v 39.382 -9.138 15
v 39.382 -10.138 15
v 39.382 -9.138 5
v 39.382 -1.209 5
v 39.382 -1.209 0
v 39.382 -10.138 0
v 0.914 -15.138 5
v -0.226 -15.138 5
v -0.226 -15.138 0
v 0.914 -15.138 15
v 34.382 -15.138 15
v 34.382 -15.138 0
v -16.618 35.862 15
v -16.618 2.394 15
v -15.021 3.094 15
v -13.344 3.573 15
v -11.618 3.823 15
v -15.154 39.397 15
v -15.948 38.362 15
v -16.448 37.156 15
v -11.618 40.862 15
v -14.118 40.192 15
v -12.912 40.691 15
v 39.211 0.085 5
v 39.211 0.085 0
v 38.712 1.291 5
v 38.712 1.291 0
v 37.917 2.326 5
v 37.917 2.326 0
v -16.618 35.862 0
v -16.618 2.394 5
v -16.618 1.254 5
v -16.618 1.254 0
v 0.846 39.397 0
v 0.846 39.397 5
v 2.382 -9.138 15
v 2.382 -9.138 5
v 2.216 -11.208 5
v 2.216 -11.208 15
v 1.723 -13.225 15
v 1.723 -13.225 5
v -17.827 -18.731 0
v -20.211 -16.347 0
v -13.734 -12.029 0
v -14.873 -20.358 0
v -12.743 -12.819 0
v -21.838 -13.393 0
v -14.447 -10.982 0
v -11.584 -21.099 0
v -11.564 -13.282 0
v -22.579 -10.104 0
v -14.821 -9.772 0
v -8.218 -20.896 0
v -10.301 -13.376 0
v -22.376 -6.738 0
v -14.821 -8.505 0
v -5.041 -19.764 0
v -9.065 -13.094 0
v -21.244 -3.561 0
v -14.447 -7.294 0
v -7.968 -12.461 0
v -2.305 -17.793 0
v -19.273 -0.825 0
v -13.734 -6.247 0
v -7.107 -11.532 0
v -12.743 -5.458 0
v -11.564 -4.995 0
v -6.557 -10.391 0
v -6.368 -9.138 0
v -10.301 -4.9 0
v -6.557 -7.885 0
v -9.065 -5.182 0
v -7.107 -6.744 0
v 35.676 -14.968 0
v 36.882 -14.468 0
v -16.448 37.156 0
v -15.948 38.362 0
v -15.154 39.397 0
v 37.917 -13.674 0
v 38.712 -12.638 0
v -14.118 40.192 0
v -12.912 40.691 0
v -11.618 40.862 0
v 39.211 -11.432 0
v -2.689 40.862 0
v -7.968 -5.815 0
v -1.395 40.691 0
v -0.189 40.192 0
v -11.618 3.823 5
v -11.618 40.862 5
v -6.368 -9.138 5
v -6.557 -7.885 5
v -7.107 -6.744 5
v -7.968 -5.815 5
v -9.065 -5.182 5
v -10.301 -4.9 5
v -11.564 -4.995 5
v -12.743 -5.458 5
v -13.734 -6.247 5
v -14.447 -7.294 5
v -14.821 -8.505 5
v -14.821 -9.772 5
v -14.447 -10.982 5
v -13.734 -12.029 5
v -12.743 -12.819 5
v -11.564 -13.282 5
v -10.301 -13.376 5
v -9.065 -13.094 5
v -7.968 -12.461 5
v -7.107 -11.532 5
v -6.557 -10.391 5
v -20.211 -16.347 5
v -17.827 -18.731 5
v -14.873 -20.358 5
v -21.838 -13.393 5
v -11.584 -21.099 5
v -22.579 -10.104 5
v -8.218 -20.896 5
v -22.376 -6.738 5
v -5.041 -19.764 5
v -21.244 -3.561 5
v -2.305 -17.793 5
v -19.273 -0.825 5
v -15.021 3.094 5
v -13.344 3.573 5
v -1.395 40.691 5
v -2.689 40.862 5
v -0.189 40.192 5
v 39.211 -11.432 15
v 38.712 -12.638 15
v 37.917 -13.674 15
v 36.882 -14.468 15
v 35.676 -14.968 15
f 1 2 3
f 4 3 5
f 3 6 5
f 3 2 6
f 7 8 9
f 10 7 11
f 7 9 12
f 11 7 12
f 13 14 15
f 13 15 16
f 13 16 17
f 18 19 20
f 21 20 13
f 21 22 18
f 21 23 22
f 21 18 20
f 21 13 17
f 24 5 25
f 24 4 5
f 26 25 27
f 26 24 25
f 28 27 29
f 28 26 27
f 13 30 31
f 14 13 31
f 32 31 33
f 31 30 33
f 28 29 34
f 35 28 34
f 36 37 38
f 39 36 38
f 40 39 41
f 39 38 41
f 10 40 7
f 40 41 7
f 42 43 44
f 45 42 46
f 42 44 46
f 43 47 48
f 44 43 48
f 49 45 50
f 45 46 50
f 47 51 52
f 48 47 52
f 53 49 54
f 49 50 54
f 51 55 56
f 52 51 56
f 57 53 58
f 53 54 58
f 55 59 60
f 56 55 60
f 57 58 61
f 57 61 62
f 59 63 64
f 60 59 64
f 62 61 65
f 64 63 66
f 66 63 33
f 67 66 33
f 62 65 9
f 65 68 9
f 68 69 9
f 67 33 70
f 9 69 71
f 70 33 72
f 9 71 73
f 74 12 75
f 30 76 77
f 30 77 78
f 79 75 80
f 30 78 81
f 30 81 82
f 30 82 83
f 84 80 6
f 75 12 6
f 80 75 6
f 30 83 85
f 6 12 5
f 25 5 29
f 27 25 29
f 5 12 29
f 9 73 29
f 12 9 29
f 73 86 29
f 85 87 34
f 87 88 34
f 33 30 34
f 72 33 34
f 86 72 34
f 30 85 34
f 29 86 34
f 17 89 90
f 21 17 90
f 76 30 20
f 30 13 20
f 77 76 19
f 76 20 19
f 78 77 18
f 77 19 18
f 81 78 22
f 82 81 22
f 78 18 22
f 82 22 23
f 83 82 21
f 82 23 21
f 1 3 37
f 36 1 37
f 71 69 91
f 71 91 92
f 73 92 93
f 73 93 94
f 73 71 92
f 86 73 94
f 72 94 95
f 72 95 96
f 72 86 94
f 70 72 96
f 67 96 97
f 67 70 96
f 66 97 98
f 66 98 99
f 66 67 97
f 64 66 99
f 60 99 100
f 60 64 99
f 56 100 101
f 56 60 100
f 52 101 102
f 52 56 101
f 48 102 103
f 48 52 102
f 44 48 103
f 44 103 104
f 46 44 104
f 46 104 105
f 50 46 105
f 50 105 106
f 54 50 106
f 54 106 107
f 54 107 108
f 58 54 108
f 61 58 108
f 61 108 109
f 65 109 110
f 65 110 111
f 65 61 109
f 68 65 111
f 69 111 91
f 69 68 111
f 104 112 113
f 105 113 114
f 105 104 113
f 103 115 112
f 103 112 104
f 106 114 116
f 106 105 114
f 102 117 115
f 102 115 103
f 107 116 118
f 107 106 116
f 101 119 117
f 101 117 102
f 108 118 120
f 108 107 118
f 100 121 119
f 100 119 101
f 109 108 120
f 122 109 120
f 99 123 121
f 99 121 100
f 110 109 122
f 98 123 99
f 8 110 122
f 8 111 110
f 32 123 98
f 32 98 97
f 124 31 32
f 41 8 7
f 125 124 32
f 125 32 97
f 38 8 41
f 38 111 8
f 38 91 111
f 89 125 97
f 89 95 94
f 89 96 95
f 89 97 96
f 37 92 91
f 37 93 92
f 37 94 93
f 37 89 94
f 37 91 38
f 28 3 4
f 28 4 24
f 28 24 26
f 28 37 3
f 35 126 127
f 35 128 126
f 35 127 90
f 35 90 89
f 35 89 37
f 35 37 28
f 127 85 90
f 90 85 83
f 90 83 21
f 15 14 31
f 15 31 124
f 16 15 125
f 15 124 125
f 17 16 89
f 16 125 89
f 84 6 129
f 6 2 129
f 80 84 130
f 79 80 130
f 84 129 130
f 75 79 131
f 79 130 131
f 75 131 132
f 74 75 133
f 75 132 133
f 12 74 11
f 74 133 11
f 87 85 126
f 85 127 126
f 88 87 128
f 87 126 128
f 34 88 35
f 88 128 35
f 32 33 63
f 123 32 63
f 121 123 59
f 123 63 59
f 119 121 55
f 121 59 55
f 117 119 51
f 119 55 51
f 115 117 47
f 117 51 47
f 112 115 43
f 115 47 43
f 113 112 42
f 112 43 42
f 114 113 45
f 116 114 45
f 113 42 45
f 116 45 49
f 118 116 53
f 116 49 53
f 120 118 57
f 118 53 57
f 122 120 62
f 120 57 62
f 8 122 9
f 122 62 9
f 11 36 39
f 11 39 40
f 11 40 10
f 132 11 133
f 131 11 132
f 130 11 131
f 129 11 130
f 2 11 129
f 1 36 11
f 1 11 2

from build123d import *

# Parameters (mm, degrees)
F1_R     = 4.25
F2_DEPTH = 5
F3_DEPTH = 15
F4_R     = 4.99999


# Not quite as in the source:
# - a fillet or chamfer is up to 0.001 mm smaller than in the source, because OpenCascade refuses the exact size
# - a feature names something its author has since deleted; it is built from what else it names


with BuildPart() as f2:
    # F1 (on Top) → F2 (new body)
    with BuildSketch(Plane.XY):
        with BuildLine():
            Line((39.3818591636, 0.8618591636), (-0.6181408364, 0.8618591636))
            Line((-0.6181408364, 0.8618591636), (-0.6181408364, 40.8618591636))
            Line((-0.6181408364, 40.8618591636), (-11.6181408364, 40.8618591636))
            Line((-11.6181408364, 40.8618591636), (-11.6181408364, 3.8233405604))
            ThreePointArc((-11.6181408364, 3.8233405604), (-14.1903183566, 3.3614410672), (-16.6181408364, 2.3944217582))
            Line((-16.6181408364, 2.3944217582), (-16.6181408364, 1.254164009))
            ThreePointArc((-16.6181408364, 1.254164009), (-19.1034222107, -17.6234222107), (-0.225835991, -15.1381408364))
            Line((-0.225835991, -15.1381408364), (0.9144217582, -15.1381408364))
            ThreePointArc((0.9144217582, -15.1381408364), (2.0096719934, -12.2265616521), (2.3818591636, -9.1381408364))
            Line((2.3818591636, -9.1381408364), (39.3818591636, -9.1381408364))
            Line((39.3818591636, -9.1381408364), (39.3818591636, 0.8618591636))
        make_face()
        with Locations((-10.6181408364, -9.1381408364)):
            Circle(F1_R, mode=Mode.SUBTRACT)
        Polygon((-0.6181408364, 40.8618591636), (-0.6181408364, 0.8618591636), (39.3818591636, 0.8618591636), align=None)
    extrude(amount=F2_DEPTH)

    # F1 (on Top) → F3 (join)
    with BuildSketch(Plane.XY):
        with BuildLine():
            Line((39.3818591636, -15.1381408364), (39.3818591636, -9.1381408364))
            Line((39.3818591636, -9.1381408364), (2.3818591636, -9.1381408364))
            ThreePointArc((2.3818591636, -9.1381408364), (2.0096719934, -12.2265616521), (0.9144217582, -15.1381408364))
            Line((0.9144217582, -15.1381408364), (39.3818591636, -15.1381408364))
        make_face()
        with BuildLine():
            Line((-11.6181408364, 3.8233405604), (-11.6181408364, 40.8618591636))
            Line((-11.6181408364, 40.8618591636), (-16.6181408364, 40.8618591636))
            Line((-16.6181408364, 40.8618591636), (-16.6181408364, 2.3944217582))
            ThreePointArc((-16.6181408364, 2.3944217582), (-14.1903183566, 3.3614410672), (-11.6181408364, 3.8233405604))
        make_face()
    extrude(amount=F3_DEPTH)

    # F4 (radius 5 in the source; OpenCascade refuses exactly that, so slightly less here)
    f4_edges = [f2.edges().sort_by_distance(p)[0] for p in [
        (39.381859, -15.138141, 7.5),
        (-16.618141, 40.861859, 7.5),
        (39.381859, 0.861859, 2.5),
        (-0.618141, 40.861859, 2.5),
    ]]
    fillet(f4_edges, radius=F4_R)


solid = f2.part
